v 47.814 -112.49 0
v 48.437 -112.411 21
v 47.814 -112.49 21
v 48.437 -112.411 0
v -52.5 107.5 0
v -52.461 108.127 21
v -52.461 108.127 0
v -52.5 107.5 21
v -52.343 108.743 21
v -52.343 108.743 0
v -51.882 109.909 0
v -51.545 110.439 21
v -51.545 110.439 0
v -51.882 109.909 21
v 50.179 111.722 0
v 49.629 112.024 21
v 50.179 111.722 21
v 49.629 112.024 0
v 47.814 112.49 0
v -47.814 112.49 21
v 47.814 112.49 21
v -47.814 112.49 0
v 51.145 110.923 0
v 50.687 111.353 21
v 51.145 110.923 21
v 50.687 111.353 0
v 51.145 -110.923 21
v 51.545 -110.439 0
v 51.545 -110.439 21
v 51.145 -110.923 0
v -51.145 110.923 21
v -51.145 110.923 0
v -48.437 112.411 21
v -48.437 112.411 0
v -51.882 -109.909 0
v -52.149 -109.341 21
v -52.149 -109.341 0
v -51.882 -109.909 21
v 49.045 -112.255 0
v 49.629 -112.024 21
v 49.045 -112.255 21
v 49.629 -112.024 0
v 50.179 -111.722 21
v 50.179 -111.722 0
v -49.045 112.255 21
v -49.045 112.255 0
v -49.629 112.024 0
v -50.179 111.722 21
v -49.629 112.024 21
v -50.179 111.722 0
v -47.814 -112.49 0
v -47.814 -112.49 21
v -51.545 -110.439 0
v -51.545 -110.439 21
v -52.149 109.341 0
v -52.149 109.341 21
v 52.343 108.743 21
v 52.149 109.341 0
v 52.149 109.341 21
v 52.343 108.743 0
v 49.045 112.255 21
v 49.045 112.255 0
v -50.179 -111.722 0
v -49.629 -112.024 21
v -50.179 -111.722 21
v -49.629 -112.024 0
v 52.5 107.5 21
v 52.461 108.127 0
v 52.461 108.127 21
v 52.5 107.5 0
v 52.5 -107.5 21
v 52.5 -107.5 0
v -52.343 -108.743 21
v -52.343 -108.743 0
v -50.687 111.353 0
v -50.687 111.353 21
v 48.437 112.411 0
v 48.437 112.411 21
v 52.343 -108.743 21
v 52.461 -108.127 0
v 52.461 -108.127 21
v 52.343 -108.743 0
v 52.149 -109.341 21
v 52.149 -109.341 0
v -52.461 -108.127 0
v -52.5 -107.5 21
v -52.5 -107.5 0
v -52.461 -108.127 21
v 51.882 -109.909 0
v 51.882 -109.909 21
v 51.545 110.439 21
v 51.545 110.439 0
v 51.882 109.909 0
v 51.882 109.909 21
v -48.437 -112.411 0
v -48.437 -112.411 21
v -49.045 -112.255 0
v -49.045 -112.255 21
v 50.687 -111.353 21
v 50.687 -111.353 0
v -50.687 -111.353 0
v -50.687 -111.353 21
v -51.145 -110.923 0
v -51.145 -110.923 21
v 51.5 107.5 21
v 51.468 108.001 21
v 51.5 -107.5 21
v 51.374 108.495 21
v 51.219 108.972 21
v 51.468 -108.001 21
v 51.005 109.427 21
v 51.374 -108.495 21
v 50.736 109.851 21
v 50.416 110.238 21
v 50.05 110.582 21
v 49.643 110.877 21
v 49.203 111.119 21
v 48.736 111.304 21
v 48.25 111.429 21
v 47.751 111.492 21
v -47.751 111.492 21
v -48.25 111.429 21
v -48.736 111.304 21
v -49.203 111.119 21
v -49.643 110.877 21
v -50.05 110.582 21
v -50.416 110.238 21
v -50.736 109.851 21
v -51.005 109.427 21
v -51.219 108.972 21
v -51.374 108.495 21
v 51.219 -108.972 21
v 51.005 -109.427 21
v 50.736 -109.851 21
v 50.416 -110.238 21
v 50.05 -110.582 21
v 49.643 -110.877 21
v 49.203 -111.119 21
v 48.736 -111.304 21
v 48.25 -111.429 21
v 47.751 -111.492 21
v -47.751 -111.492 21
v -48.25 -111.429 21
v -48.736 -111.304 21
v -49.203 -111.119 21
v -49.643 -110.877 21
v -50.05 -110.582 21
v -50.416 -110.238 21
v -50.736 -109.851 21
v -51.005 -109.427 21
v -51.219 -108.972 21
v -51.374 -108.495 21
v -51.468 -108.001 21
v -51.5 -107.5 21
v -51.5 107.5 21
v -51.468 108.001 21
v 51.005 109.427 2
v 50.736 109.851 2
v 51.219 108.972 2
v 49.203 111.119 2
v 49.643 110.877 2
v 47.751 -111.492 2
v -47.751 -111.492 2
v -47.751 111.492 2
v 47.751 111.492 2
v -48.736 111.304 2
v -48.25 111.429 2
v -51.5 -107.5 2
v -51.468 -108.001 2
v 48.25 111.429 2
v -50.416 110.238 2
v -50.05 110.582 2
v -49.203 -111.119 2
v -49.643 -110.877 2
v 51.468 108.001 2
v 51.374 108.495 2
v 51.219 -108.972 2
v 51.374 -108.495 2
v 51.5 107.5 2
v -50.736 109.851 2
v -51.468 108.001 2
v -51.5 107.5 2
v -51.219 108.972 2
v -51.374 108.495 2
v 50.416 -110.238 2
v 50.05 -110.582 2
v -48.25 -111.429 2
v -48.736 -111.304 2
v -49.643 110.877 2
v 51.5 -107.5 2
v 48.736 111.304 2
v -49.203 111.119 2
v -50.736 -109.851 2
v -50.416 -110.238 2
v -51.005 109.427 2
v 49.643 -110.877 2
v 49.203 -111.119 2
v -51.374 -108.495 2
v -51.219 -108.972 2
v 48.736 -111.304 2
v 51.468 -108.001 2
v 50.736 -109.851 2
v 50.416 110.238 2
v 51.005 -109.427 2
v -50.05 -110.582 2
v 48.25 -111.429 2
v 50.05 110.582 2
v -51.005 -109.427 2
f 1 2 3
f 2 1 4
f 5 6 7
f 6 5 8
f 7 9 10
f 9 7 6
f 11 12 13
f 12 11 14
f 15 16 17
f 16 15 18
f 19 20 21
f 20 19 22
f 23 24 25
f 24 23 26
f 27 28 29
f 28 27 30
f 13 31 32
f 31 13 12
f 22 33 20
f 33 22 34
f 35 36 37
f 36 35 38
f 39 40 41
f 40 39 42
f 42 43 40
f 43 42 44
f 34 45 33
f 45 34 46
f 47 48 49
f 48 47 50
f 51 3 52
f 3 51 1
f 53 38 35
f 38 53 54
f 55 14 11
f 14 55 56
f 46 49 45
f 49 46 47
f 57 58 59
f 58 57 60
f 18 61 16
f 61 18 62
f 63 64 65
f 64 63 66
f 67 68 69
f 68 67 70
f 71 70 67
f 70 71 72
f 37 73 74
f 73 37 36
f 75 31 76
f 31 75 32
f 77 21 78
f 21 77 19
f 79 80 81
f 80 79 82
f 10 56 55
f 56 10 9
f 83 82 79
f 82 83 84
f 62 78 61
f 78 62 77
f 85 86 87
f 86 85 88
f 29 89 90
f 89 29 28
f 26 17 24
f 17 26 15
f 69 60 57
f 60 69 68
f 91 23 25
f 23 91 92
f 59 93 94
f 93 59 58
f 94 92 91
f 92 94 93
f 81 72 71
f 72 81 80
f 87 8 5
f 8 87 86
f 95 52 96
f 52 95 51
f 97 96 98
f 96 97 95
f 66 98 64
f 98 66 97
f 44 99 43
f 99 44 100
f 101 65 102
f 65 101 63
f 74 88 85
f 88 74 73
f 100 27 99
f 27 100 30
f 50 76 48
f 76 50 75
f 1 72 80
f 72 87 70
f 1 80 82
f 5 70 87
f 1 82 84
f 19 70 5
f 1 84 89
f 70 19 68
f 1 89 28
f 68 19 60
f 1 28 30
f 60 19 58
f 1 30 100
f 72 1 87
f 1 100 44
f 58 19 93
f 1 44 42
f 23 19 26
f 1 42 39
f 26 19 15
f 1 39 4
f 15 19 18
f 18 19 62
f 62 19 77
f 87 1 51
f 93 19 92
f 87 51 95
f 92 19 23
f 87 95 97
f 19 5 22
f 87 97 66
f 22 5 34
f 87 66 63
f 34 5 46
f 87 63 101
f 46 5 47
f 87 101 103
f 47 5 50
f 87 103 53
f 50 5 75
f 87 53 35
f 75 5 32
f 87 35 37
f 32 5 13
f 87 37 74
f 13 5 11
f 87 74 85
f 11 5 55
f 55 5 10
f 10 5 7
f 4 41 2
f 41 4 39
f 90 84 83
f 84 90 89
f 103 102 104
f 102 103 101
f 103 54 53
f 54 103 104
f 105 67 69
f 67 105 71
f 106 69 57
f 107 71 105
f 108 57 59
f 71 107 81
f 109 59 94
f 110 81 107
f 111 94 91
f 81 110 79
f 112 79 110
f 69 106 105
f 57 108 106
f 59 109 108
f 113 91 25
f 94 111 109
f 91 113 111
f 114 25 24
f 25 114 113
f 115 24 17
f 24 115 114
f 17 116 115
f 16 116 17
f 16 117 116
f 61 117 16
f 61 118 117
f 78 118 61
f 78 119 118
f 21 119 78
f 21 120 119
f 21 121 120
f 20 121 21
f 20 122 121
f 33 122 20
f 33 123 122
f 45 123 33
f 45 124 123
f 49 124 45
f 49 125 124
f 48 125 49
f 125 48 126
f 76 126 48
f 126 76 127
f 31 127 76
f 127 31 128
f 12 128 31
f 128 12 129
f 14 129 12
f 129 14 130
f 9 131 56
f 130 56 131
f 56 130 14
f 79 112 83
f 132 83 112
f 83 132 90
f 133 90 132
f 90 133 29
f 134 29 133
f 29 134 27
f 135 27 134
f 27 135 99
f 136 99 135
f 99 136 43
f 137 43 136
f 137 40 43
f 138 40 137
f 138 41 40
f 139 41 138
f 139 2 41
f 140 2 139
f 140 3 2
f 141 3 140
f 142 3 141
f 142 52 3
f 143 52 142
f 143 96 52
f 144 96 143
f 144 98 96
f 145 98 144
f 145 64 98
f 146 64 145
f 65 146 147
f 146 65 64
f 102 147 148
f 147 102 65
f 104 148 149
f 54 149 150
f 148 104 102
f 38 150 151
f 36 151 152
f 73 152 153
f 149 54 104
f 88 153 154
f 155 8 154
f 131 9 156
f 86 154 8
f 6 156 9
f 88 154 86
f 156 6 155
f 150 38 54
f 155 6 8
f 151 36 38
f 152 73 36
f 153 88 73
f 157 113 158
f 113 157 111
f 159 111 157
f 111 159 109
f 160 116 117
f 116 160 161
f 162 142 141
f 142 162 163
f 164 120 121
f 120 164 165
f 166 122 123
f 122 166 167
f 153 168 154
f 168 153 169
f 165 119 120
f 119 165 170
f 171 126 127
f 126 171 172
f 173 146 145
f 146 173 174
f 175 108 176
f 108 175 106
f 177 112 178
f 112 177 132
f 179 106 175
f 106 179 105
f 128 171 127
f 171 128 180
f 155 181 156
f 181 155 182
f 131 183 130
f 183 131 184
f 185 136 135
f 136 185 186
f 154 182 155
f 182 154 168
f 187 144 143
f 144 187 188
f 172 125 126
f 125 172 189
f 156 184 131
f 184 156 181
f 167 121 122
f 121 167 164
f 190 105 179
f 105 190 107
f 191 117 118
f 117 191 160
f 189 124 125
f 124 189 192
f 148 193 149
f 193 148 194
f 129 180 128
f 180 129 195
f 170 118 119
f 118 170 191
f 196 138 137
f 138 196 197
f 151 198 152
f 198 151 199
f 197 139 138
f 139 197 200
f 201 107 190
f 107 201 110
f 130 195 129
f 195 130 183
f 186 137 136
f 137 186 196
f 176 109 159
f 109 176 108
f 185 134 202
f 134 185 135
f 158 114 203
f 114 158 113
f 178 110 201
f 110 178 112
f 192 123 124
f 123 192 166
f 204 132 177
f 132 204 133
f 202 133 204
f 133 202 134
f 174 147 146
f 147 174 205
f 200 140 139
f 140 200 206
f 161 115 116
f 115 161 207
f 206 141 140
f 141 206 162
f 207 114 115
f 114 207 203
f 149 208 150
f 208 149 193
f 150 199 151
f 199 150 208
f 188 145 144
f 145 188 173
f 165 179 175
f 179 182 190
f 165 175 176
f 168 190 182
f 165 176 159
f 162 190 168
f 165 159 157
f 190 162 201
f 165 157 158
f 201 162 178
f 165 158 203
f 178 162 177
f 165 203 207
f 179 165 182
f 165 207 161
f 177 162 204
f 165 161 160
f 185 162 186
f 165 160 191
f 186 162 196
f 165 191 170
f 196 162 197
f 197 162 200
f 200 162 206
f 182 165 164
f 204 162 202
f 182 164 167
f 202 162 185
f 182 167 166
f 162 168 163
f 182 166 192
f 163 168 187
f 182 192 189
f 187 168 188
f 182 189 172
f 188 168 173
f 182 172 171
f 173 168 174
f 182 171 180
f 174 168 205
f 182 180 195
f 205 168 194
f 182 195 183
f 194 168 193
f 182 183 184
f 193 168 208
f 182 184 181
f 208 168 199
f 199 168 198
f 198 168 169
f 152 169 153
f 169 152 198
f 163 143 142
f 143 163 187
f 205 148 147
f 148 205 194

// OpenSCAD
$fn = 50;


difference() {
	union() {
		hull() {
			translate(v = [-47.5000000000, 107.5000000000, 0]) {
				cylinder(h = 21, r = 5);
			}
			translate(v = [47.5000000000, 107.5000000000, 0]) {
				cylinder(h = 21, r = 5);
			}
			translate(v = [-47.5000000000, -107.5000000000, 0]) {
				cylinder(h = 21, r = 5);
			}
			translate(v = [47.5000000000, -107.5000000000, 0]) {
				cylinder(h = 21, r = 5);
			}
		}
	}
	union() {
		translate(v = [0, 0, 2]) {
			hull() {
				translate(v = [-47.5000000000, 107.5000000000, 0]) {
					cylinder(h = 19, r = 4);
				}
				translate(v = [47.5000000000, 107.5000000000, 0]) {
					cylinder(h = 19, r = 4);
				}
				translate(v = [-47.5000000000, -107.5000000000, 0]) {
					cylinder(h = 19, r = 4);
				}
				translate(v = [47.5000000000, -107.5000000000, 0]) {
					cylinder(h = 19, r = 4);
				}
			}
		}
	}
}
